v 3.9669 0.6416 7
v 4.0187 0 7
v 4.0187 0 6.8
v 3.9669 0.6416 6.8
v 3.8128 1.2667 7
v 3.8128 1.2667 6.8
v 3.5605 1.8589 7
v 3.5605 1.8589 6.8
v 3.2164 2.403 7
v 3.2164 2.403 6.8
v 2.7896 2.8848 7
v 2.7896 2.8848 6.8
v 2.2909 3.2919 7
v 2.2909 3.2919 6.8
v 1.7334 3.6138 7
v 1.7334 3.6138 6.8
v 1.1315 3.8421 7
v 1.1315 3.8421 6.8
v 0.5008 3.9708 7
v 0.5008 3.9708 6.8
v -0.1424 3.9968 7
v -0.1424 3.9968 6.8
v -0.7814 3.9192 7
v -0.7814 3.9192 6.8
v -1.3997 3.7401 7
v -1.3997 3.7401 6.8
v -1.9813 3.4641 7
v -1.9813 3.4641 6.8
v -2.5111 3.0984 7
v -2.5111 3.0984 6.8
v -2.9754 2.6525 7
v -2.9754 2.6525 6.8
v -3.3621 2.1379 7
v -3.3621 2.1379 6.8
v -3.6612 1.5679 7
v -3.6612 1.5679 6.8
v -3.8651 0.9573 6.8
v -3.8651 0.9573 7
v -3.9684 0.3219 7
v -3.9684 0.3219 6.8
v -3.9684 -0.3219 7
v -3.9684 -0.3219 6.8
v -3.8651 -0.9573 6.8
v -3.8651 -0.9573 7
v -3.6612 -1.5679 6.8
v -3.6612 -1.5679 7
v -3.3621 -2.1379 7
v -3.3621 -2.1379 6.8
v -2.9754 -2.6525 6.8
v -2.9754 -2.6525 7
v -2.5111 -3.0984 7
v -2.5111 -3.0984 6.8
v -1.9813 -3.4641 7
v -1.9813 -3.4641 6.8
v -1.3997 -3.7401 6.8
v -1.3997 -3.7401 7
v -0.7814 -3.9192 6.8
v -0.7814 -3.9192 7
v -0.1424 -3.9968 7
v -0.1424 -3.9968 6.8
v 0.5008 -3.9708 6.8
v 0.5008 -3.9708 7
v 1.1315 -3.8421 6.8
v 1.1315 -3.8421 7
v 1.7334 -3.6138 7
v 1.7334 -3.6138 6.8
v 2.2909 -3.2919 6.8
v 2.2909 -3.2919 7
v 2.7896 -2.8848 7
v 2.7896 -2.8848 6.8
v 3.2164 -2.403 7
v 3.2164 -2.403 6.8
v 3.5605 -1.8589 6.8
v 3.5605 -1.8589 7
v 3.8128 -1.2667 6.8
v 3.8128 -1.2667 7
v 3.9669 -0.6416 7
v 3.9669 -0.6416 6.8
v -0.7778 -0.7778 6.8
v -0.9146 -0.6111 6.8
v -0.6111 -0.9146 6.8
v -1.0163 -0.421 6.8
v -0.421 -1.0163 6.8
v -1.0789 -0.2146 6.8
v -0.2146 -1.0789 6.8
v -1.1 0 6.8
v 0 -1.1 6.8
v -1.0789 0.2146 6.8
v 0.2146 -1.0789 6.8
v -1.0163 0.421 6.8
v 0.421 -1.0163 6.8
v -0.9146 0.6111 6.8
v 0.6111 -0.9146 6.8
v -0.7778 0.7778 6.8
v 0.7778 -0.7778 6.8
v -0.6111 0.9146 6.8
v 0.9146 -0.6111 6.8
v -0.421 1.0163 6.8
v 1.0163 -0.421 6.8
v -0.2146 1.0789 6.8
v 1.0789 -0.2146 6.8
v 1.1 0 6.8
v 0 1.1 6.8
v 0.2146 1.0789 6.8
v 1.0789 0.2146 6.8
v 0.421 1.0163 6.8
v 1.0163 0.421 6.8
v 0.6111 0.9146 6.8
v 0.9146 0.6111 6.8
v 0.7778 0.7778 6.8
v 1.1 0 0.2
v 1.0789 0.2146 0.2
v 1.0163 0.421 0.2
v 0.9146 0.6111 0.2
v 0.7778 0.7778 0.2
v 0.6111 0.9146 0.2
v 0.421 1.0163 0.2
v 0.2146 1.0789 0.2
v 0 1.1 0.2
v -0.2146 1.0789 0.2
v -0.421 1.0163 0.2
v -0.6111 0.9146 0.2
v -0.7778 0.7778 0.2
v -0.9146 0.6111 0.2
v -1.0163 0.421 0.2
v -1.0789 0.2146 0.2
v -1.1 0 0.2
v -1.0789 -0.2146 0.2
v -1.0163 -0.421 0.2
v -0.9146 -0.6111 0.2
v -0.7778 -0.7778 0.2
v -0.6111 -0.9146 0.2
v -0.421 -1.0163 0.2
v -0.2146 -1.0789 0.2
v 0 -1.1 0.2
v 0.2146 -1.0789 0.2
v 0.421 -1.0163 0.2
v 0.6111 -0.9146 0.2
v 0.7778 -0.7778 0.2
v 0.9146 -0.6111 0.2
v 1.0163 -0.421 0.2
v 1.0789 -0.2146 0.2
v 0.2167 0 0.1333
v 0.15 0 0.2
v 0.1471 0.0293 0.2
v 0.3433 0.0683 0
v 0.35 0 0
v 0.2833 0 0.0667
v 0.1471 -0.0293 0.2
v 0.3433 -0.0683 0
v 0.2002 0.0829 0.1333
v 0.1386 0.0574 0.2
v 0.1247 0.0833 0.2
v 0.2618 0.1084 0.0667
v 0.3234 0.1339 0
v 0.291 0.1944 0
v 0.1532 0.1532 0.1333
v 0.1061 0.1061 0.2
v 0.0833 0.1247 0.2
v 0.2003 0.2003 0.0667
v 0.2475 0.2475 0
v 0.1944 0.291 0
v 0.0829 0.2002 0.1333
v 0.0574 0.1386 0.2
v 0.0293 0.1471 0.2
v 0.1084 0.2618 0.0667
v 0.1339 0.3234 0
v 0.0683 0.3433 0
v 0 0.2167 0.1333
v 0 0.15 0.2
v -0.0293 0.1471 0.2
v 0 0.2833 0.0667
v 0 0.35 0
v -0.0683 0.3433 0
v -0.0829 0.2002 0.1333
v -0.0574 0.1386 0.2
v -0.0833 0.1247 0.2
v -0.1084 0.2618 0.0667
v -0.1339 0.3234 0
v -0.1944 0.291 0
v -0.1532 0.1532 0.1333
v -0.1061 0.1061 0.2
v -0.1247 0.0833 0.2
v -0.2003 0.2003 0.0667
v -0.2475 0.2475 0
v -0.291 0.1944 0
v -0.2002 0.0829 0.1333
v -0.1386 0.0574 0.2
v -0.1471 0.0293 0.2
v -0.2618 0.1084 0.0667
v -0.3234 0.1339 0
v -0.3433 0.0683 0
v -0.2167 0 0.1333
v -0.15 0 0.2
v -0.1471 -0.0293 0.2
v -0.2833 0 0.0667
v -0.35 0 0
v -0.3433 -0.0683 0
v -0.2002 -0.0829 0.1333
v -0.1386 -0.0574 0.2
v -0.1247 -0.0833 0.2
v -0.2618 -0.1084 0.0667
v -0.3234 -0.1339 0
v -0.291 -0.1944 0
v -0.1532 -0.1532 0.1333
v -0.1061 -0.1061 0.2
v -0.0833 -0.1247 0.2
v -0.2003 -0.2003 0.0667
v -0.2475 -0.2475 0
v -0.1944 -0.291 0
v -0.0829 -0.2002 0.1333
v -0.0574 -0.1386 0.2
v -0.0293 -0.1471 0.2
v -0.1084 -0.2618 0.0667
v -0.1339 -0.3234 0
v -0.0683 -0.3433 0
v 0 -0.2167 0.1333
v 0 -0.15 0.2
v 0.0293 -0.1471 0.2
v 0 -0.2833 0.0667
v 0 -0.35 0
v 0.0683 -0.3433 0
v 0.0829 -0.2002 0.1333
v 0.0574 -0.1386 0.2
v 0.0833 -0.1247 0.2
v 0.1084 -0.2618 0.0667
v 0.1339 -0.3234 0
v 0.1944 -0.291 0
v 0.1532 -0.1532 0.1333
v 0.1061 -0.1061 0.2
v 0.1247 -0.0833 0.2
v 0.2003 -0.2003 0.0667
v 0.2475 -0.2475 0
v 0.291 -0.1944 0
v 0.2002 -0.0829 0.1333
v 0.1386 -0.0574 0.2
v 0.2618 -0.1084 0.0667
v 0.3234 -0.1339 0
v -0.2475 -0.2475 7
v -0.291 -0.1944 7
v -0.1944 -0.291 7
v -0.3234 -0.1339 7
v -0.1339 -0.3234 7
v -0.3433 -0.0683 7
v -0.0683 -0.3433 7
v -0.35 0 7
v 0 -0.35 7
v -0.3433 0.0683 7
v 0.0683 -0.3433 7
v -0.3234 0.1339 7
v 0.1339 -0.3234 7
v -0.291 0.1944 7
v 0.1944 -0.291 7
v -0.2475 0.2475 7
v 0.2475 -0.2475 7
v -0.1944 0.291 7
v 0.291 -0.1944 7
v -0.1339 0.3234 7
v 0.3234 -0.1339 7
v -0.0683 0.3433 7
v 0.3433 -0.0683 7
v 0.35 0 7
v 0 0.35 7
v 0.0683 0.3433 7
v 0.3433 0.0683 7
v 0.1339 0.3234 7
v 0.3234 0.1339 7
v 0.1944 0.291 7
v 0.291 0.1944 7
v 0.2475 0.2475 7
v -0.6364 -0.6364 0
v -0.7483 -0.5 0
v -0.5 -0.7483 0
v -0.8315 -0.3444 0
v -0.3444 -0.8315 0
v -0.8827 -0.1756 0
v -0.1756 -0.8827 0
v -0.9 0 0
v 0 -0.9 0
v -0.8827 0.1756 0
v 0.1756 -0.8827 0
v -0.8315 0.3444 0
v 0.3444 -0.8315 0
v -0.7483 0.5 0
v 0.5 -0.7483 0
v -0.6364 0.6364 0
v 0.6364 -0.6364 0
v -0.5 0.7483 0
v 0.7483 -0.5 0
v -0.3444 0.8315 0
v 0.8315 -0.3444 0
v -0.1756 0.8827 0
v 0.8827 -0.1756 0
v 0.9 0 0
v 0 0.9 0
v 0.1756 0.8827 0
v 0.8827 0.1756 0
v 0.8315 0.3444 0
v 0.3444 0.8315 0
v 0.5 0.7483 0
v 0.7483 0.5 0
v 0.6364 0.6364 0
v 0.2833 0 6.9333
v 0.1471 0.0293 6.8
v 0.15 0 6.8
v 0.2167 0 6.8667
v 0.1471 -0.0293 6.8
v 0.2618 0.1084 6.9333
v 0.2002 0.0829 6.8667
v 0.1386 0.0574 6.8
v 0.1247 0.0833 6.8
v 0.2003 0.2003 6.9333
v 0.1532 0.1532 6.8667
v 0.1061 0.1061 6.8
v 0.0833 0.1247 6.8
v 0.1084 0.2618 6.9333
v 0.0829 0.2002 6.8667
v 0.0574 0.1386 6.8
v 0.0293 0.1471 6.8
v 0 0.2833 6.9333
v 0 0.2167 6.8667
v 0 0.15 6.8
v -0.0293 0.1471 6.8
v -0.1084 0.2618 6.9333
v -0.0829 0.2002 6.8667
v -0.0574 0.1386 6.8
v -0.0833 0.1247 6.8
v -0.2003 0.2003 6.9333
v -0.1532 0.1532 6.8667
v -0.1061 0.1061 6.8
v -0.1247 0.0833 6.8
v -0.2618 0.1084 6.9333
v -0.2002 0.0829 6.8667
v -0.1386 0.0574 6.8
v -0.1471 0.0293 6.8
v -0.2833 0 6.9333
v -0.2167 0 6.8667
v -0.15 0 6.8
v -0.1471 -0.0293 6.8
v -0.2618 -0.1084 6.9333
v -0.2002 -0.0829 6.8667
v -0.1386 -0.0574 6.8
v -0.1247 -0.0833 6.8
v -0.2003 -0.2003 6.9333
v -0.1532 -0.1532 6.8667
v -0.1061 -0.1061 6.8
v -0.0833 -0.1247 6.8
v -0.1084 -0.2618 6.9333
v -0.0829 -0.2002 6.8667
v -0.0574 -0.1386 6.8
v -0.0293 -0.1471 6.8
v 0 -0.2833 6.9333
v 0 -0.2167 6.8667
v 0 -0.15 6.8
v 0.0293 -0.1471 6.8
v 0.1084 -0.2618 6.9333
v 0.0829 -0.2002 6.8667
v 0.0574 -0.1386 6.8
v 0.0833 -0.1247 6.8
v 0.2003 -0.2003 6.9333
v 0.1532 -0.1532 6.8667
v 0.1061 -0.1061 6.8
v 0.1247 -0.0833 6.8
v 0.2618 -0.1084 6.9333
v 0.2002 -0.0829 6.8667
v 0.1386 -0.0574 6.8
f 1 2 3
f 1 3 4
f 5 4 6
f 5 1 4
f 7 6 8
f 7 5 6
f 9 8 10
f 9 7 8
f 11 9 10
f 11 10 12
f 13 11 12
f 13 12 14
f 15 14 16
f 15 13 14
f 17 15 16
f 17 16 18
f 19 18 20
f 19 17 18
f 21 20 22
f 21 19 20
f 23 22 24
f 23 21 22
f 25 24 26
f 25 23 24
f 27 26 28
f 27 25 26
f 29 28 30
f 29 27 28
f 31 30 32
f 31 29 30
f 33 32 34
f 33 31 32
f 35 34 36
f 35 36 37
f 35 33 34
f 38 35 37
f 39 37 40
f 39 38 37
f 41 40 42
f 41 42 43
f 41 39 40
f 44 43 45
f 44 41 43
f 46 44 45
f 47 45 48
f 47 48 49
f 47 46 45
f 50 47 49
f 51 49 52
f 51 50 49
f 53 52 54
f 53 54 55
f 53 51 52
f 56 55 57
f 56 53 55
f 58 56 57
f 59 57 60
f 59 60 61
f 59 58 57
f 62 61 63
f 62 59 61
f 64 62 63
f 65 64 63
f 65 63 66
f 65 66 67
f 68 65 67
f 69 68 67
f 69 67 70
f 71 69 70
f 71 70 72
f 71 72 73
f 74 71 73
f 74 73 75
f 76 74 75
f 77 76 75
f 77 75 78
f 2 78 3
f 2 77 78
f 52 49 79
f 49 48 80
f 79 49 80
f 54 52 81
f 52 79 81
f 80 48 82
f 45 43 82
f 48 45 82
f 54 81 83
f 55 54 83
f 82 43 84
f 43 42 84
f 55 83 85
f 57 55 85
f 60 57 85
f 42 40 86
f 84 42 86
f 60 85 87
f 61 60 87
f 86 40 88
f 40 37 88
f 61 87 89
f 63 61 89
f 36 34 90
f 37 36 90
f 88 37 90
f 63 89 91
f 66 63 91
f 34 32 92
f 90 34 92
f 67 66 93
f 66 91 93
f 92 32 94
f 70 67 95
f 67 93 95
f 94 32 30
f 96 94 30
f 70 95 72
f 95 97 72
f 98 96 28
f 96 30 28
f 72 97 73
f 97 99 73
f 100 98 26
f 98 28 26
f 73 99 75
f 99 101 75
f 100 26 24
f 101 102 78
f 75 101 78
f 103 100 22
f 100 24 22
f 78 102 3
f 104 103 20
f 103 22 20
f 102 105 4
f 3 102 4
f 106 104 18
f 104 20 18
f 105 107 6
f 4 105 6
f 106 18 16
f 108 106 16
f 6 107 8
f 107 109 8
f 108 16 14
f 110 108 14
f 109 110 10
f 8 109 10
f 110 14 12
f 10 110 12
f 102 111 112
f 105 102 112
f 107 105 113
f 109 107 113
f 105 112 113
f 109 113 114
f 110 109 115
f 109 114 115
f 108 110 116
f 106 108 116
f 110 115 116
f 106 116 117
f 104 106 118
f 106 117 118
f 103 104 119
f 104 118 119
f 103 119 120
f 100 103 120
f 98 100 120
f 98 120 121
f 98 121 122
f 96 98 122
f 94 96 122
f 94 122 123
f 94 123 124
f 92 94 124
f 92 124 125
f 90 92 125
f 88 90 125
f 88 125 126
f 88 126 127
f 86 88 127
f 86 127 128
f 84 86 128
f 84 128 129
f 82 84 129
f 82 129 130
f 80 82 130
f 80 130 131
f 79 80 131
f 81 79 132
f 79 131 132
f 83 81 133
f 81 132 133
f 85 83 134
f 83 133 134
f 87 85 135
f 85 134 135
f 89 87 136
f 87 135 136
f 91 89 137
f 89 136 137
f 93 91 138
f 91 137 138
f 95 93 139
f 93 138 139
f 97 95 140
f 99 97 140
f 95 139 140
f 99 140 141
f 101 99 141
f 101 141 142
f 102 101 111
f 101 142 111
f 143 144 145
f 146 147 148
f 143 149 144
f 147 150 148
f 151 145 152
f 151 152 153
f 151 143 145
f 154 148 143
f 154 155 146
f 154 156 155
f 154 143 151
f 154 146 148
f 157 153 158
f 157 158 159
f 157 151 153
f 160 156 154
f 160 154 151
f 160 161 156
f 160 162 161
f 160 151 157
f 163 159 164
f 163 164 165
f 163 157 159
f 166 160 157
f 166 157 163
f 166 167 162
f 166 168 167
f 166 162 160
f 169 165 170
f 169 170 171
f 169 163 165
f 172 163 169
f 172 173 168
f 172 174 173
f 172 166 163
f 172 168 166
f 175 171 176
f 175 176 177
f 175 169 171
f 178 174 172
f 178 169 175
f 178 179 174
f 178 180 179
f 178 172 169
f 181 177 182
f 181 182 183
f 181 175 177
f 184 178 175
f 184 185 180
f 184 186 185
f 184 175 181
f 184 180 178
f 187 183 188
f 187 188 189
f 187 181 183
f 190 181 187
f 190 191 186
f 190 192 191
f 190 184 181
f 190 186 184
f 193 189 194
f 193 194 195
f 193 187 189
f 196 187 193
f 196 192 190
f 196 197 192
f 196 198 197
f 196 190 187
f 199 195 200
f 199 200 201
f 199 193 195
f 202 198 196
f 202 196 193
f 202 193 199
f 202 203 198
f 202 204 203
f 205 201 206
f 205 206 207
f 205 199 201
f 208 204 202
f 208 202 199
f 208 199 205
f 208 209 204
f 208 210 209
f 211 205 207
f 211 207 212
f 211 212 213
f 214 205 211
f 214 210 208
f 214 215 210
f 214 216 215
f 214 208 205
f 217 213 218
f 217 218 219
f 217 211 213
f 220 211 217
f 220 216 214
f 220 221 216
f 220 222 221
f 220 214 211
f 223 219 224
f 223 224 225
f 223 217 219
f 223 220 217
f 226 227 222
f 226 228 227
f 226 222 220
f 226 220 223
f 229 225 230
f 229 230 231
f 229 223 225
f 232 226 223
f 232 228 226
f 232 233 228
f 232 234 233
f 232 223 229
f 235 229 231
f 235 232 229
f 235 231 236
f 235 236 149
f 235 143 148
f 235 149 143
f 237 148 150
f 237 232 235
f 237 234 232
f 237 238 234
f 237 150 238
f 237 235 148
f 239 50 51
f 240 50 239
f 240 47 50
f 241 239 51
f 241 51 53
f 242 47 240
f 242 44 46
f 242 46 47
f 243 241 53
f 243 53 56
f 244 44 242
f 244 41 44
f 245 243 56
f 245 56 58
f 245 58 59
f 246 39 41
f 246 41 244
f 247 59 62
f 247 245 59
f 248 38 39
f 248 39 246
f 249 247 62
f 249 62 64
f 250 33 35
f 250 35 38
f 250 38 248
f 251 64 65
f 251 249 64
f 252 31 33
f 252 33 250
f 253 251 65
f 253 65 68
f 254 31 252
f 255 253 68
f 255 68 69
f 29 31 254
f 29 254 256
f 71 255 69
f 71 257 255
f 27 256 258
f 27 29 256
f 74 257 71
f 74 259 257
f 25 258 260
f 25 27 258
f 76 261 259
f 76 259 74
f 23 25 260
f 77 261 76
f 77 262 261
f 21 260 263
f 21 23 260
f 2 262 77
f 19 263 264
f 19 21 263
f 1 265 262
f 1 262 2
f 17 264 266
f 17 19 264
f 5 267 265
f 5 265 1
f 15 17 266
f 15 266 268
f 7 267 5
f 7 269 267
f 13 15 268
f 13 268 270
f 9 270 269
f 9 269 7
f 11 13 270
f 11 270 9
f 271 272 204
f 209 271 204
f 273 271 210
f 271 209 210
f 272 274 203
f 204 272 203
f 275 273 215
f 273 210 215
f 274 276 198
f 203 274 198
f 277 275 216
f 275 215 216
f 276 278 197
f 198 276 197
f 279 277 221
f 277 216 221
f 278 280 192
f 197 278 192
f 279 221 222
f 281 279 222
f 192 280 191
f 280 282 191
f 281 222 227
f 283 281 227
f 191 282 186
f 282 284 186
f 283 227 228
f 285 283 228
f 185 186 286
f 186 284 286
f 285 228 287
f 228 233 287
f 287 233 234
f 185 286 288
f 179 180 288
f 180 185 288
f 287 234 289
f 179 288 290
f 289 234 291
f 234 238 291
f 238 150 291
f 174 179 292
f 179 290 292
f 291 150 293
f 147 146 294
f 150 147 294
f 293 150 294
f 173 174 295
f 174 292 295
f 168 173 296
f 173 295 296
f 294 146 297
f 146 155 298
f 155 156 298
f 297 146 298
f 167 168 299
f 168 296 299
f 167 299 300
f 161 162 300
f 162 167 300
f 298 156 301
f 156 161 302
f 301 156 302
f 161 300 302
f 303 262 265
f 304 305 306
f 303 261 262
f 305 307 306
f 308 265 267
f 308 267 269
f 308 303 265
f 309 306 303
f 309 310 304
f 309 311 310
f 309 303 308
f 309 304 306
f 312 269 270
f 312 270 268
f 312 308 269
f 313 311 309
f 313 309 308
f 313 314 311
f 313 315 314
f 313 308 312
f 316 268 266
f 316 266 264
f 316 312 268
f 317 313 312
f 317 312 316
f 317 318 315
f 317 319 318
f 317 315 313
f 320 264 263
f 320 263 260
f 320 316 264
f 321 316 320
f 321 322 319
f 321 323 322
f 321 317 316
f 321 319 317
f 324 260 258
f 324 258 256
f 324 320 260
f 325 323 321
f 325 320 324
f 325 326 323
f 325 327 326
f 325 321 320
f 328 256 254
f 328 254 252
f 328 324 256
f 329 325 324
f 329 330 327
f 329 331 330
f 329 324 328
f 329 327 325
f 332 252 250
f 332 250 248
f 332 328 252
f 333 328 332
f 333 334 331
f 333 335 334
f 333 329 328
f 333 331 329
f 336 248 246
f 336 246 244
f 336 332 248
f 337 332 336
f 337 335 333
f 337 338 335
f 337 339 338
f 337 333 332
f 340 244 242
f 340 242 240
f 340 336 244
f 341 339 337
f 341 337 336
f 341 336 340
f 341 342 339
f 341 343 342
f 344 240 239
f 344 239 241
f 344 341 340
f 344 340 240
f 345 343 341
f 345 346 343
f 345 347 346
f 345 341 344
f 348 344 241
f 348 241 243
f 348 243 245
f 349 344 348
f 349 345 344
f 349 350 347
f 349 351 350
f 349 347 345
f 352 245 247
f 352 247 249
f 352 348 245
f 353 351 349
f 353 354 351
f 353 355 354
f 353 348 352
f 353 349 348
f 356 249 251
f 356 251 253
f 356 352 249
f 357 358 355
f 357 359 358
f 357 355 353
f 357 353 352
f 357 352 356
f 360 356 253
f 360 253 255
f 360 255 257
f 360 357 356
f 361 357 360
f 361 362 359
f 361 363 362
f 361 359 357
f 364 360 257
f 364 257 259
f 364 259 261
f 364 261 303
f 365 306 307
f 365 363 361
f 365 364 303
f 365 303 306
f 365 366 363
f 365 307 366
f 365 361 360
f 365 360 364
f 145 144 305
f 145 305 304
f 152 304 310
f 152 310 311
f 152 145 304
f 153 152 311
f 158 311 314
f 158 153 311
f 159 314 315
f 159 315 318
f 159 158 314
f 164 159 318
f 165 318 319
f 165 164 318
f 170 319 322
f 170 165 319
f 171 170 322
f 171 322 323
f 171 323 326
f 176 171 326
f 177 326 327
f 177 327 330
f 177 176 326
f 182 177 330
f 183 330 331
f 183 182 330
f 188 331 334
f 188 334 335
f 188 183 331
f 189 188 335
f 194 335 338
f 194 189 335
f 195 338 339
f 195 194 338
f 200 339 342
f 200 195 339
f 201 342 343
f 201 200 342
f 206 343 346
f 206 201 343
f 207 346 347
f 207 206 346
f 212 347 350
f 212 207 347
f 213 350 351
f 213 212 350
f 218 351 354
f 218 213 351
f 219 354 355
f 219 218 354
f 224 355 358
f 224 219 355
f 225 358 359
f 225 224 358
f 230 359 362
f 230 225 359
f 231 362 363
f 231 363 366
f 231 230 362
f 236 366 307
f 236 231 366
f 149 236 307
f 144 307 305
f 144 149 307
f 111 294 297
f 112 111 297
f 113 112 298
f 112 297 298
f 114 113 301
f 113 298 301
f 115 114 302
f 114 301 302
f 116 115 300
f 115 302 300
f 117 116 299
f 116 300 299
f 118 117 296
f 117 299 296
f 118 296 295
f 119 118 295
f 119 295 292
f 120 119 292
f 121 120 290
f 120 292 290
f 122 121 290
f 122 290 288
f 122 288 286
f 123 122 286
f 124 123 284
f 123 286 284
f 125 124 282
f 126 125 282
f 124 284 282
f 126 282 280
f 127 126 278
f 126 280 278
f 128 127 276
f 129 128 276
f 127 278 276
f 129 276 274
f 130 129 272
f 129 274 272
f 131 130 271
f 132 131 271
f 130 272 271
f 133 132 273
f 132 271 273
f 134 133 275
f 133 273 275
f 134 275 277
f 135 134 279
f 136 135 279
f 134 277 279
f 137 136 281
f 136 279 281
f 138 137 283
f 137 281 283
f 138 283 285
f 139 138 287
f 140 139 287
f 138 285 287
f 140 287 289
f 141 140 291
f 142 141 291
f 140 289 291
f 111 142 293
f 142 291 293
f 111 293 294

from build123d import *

# Parameters (mm, degrees)
SKETCH1_R           = 1.1
SKETCH1_R_2         = 0.15
BOSS_EXTRUDE1_DEPTH = 7
SKETCH2_R           = 4
SKETCH2_R_2         = 1.1
BOSS_EXTRUDE2_DEPTH = 0.2
CHAMFER1_SIZE       = 0.2


with BuildPart() as part:
    # Sketch1 → Boss-Extrude1 (new body)
    with BuildSketch(Plane.XY):
        Circle(SKETCH1_R)
        Circle(SKETCH1_R_2, mode=Mode.SUBTRACT)
    extrude(amount=BOSS_EXTRUDE1_DEPTH)

    # Sketch2 → Boss-Extrude2 (add)
    with BuildSketch(Plane.XY.offset(7)):
        with Locations((0.018669882, 0)):
            Circle(SKETCH2_R)
        Circle(SKETCH2_R_2, mode=Mode.SUBTRACT)
    extrude(amount=-BOSS_EXTRUDE2_DEPTH)

    # Chamfer1
    chamfer1_edges = [part.edges().sort_by_distance(p)[0] for p in [
        (-1.1, 0, 0),
        (-0.15, 0, 0),
        (-0.15, 0, 7),
    ]]
    chamfer(chamfer1_edges, length=CHAMFER1_SIZE)


solid = part.part
